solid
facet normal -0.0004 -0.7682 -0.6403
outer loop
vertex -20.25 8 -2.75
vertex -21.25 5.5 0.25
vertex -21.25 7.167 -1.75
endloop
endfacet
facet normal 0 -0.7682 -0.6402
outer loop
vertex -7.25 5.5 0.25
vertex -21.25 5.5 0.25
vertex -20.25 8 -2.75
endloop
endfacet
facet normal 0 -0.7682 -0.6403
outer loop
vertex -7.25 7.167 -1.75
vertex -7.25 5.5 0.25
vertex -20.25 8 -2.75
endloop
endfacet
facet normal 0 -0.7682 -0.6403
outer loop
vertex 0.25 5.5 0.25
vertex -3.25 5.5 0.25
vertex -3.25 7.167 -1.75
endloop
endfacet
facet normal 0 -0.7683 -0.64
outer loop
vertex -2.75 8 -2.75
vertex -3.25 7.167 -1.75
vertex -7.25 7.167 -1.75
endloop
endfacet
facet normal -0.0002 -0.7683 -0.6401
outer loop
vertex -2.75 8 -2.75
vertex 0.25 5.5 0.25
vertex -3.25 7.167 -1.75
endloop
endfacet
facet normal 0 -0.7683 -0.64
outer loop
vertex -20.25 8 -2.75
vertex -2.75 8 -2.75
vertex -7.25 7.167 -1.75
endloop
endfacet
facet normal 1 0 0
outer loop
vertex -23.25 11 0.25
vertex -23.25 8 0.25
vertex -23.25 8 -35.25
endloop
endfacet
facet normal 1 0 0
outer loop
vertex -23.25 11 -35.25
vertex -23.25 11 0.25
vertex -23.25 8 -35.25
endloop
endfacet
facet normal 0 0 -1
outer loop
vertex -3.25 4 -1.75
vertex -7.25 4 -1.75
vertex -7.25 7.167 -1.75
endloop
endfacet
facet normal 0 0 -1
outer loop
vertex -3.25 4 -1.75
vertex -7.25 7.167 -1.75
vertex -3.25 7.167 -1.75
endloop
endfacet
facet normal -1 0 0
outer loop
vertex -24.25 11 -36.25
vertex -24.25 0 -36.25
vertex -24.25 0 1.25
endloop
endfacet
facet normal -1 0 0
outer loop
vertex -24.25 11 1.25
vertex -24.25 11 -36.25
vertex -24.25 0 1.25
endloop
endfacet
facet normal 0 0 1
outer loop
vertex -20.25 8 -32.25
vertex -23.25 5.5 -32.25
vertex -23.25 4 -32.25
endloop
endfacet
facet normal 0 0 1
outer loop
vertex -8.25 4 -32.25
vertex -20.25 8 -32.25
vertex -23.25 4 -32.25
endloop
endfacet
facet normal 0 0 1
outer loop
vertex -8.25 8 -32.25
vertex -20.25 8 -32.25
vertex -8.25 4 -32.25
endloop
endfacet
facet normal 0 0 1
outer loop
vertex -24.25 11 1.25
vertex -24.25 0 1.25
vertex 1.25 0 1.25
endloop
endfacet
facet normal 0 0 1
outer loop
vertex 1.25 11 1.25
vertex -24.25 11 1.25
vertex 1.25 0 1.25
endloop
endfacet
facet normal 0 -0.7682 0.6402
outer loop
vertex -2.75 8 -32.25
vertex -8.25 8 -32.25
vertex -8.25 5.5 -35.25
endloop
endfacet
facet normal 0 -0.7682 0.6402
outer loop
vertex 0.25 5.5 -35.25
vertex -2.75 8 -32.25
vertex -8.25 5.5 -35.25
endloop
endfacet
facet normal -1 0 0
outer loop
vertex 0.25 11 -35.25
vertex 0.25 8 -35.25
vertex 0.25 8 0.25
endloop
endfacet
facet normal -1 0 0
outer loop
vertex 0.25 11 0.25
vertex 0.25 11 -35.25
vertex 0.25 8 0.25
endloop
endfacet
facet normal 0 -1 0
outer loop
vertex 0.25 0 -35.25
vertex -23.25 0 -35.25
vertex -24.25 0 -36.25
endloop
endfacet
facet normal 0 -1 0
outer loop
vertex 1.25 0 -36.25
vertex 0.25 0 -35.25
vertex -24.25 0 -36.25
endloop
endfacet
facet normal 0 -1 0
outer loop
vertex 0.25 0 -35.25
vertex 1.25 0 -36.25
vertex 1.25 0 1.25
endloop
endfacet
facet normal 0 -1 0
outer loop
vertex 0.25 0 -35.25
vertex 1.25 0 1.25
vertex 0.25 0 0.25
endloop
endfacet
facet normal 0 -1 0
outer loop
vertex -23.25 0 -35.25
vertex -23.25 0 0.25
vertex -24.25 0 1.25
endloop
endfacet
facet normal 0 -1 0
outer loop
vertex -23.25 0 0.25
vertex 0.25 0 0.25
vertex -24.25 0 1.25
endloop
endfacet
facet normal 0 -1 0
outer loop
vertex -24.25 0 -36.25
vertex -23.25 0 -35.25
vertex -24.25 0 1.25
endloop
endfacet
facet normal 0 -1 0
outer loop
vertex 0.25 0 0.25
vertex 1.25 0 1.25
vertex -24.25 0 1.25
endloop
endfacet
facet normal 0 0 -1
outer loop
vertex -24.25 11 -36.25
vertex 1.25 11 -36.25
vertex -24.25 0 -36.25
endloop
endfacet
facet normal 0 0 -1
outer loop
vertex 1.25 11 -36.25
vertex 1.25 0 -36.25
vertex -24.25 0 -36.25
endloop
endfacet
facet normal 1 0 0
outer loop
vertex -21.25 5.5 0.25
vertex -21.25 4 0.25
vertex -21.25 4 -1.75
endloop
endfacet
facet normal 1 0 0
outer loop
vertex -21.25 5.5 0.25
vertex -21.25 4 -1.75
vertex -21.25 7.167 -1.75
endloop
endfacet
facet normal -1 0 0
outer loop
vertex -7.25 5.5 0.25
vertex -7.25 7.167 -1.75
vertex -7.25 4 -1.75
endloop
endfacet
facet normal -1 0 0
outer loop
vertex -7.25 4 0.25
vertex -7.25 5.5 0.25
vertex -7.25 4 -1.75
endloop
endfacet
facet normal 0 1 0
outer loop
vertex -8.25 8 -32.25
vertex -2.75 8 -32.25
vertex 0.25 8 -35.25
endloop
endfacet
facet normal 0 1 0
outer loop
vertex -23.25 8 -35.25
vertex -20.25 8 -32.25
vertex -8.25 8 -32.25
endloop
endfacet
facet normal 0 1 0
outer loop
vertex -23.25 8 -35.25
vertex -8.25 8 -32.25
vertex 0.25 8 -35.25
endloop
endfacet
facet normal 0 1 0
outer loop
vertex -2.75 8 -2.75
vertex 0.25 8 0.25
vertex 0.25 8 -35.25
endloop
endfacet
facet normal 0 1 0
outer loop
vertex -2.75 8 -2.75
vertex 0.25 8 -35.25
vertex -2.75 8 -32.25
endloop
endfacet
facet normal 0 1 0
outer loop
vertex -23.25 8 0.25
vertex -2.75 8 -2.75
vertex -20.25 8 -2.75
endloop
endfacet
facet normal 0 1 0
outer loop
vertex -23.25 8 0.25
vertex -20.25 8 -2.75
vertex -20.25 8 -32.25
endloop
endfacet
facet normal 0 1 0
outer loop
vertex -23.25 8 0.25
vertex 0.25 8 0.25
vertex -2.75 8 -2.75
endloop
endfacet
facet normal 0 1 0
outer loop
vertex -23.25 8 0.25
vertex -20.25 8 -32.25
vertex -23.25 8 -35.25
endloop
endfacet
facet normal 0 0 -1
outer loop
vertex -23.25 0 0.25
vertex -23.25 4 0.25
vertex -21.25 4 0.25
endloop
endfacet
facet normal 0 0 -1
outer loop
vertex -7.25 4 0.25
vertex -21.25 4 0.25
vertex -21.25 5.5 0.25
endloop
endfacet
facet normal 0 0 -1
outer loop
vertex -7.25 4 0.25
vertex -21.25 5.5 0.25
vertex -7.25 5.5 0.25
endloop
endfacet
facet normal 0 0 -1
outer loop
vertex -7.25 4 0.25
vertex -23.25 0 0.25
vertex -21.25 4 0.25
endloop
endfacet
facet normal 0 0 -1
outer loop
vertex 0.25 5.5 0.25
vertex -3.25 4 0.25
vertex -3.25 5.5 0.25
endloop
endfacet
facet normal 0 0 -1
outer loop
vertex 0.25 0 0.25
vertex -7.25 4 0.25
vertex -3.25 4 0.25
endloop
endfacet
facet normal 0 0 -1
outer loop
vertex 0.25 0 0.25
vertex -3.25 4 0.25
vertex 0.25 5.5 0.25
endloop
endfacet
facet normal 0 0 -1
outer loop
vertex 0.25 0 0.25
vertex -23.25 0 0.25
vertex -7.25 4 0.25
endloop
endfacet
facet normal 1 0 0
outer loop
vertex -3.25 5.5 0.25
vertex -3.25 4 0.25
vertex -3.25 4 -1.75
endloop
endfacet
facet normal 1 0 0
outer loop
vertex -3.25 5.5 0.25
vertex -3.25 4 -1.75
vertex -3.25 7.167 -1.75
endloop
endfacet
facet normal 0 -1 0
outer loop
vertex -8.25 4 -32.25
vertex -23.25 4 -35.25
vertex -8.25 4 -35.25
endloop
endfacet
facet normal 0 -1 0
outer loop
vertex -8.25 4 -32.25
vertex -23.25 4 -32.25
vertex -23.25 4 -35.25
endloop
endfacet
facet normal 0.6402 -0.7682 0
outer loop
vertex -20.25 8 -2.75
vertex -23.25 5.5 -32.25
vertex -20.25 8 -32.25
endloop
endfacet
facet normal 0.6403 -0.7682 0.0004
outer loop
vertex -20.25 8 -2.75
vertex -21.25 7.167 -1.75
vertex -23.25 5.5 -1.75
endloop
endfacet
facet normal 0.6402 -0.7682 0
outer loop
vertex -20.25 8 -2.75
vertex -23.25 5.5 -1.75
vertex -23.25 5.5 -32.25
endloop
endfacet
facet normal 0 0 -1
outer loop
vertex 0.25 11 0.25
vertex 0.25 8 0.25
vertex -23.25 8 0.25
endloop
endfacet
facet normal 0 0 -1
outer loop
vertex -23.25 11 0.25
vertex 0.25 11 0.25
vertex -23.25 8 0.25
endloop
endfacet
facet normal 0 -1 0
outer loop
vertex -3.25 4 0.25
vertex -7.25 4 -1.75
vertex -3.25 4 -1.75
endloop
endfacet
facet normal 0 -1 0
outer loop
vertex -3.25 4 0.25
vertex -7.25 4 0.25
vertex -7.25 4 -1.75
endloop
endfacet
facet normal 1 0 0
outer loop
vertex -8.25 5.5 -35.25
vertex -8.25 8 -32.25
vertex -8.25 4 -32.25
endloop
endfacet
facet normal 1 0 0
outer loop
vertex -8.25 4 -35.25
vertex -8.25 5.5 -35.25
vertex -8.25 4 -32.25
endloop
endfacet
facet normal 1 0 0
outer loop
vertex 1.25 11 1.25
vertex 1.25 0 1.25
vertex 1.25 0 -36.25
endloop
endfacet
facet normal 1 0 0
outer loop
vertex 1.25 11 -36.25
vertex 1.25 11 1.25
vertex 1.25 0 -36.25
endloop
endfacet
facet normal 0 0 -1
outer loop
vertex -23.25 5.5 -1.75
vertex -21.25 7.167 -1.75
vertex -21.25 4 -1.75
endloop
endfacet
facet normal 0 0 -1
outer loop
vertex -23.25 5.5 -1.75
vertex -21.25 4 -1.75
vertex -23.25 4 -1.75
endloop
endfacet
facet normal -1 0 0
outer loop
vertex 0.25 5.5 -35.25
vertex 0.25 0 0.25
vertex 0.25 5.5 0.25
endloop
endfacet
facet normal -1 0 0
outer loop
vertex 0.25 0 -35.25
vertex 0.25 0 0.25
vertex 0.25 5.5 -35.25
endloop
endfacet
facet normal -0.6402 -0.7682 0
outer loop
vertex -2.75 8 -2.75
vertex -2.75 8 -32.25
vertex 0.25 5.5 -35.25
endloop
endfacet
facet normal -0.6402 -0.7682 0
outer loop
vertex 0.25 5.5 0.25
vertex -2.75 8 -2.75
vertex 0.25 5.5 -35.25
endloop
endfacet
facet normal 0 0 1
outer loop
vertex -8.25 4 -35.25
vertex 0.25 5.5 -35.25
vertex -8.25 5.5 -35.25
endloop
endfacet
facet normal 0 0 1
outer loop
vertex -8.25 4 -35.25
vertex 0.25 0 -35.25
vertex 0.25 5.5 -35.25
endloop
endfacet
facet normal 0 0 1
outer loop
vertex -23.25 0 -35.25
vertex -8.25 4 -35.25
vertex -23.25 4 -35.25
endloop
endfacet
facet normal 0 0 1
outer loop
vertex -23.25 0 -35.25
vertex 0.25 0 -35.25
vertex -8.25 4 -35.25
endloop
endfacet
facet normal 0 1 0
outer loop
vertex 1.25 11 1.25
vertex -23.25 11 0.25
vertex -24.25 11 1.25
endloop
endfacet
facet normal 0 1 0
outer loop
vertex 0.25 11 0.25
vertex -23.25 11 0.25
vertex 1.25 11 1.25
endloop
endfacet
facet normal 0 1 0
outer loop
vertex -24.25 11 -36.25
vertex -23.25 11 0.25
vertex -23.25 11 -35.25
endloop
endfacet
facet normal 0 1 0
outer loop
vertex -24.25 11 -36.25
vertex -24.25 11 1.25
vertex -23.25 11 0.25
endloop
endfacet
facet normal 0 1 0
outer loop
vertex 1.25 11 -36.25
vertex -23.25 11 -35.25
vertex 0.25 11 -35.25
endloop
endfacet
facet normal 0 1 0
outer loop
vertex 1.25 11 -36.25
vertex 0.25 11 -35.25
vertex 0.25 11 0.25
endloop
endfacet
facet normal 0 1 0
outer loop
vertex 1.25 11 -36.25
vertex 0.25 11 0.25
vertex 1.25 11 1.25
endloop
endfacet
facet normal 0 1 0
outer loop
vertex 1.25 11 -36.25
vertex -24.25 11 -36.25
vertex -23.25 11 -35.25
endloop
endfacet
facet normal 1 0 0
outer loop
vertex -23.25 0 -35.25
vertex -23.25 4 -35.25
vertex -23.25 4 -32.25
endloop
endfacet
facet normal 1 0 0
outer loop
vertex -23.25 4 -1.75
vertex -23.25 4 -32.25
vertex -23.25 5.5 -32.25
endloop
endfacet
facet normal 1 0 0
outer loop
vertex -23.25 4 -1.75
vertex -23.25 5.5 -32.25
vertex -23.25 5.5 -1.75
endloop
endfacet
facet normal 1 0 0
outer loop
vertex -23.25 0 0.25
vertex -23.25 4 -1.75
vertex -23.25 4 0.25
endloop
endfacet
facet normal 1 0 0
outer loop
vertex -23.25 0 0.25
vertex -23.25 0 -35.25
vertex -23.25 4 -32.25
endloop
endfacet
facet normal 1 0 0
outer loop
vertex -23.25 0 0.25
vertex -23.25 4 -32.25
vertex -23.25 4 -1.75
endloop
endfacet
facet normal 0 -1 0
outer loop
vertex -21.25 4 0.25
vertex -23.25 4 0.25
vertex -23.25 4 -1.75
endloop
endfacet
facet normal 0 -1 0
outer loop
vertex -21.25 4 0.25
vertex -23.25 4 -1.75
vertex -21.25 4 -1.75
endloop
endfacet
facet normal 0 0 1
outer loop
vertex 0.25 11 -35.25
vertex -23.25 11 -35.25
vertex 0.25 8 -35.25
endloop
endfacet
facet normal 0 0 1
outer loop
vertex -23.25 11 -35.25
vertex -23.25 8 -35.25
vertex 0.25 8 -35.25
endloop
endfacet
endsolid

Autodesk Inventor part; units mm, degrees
ref_plane "YZ Plane" through (0, 0, 0) normal (1, 0, 0) x (0, 1, 0)
sketch "Sketch1" plane through (0, 0, 0) normal (0, 1, 0) x (-1, 0, 0)
  line L0 (0, 0) -> (23, 0) construction
  line L1 (23, 0) -> (23, -35) construction
  line L2 (23, -35) -> (0, -35) construction
  line L3 (0, -35) -> (0, 0) construction
  line L4 (23.25, -35.25) -> (23.25, 0.25)
  line L5 (23.25, 0.25) -> (-0.25, 0.25)
  line L6 (-0.25, 0.25) -> (-0.25, -35.25)
  line L7 (-0.25, -35.25) -> (23.25, -35.25)
  line L8 (24.25, 1.25) -> (24.25, -36.25)
  line L9 (24.25, -36.25) -> (-1.25, -36.25)
  line L10 (-1.25, -36.25) -> (-1.25, 1.25)
  line L11 (-1.25, 1.25) -> (24.25, 1.25)
  dimension "d0" = 35
  dimension "d1" = 23
  dimension "d2" = 0.25
  dimension "d3" = 1
extrude "Extrusion1" add sketch "Sketch1" along normal blind 8
sketch "Sketch9" plane through (0.25, 0, 0.25) normal (0, 0, -1) x (-1, 0, 0)
  line L0 (-1, 0) -> (24.5, 0) projected
  line L1 (24.5, 0) -> (24.5, 8) projected
  line L2 (-1, 8) -> (24.5, 8) projected
  line L3 (-1, 0) -> (-1, 8) projected
  line L4 (0, 0) -> (23.5, 0) projected
  line L5 (23.5, 0) -> (23.5, 8) projected
  line L6 (0, 8) -> (23.5, 8) projected
  line L7 (0, 0) -> (0, 8) projected
  line L8 (0, 8) -> (3, 8)
  line L9 (24.5, 8) -> (-1, 8) projected
  line L10 (3, 8) -> (0, 5.5)
  line L11 (0, 0) -> (0, 8) projected
  line L12 (0, 8) -> (0, 5.5)
  point P0 (0.25, 0)
  point P1 (0, 8)
  dimension "d25" = 3
  dimension "d26" = 2.5
extrude "Extrusion7" add sketch "Sketch9" along normal up to surface (35.5 mm away) contours L7 L2 L10
ref_plane "Work Plane5" through (-11.5, 0, 1.25) normal (1, 0, 0) x (0, 0, -1)
mirror "Mirror4" about plane through (-11.5, 0, 1.25) normal (1, 0, 0) of "Extrusion7"
sketch "Sketch10" plane through (0.25, 0, -35.25) normal (-1, 0, 0) x (0, 0, 1)
  line L0 (-1, 0) -> (36.5, 0) projected
  line L1 (36.5, 0) -> (36.5, 8) projected
  line L2 (-1, 8) -> (36.5, 8) projected
  line L3 (-1, 0) -> (-1, 8) projected
  line L4 (35.5, 5.5) -> (0, 5.5) projected
  line L5 (0, 0) -> (0, 5.5) projected
  line L6 (0, 0) -> (35.5, 0) projected
  line L7 (35.5, 0) -> (35.5, 5.5) projected
  line L8 (36.5, 8) -> (-1, 8) projected
  line L9 (0, 8) -> (3, 8)
  line L10 (0, 0) -> (0, 5.5) projected
  line L11 (3, 8) -> (0, 5.5)
  line L12 (35.5, 5.5) -> (0, 5.5) projected
  line L13 (0, 8) -> (0, 5.5)
  point P0 (35.25, 0)
  point P1 (3, 8)
  dimension "d29" = 3
extrude "Extrusion8" add sketch "Sketch10" along normal up to surface (23.5 mm away) contours L13 L2 L11
ref_plane "Work Plane6" through (-24.25, 0, -17.5) normal (0, 0, 1) x (1, 0, 0)
mirror "Mirror5" about plane through (-24.25, 0, -17.5) normal (0, 0, 1) of "Extrusion8"
sketch "Sketch11" plane through (0, 8, 0) normal (0, 1, 0) x (1, 0, 0)
  line L0 (1.25, -1.25) -> (1.25, 36.25) projected
  line L1 (-24.25, -1.25) -> (1.25, -1.25) projected
  line L2 (-24.25, 36.25) -> (-24.25, -1.25) projected
  line L3 (1.25, 36.25) -> (-24.25, 36.25) projected
  line L4 (-23.25, 35.25) -> (0.25, 35.25) projected
  line L5 (-23.25, -0.25) -> (-23.25, 35.25) projected
  line L6 (0.25, -0.25) -> (-23.25, -0.25) projected
  line L7 (0.25, 35.25) -> (0.25, -0.25) projected
  point P0 (0, 0)
extrude "Extrusion9" add sketch "Sketch11" along normal blind 3
sketch "Sketch12" plane through (-23.25, 0, -35.25) normal (0, 0, 1) x (1, 0, 0)
  line L0 (23.5, 5.5) -> (0, 5.5) projected
  line L1 (0, 0) -> (0, 5.5) projected
  line L2 (0, 0) -> (23.5, 0) projected
  line L3 (23.5, 0) -> (23.5, 5.5) projected
  line L4 (0, 5.5) -> (15, 5.5)
  line L5 (15, 5.5) -> (15, 3.5)
  line L6 (15, 3.5) -> (0, 3.5)
  line L7 (0, 3.5) -> (0, 5.5)
  point P0 (23.25, 0)
  point P1 (0, 5.5)
  point P2 (0, 3.5)
  dimension "d34" = 3.5
  dimension "d35" = 2
  dimension "d36" = 15
extrude "Extrusion10" add sketch "Sketch12" along normal blind 3 contours L5 L6 L1 L0
sketch "Sketch13" plane through (0.25, 0, 0.25) normal (0, 0, -1) x (-1, 0, 0)
  line L0 (23.5, 3.5) -> (23.5, 5.5) projected
  line L1 (8.5, 5.5) -> (23.5, 5.5) projected
  line L2 (8.5, 3.5) -> (23.5, 3.5) projected
  line L3 (23.5, 0) -> (23.5, 3.5) projected
  line L4 (23.5, 0) -> (0, 0) projected
  line L5 (0, 0) -> (0, 5.5) projected
  line L6 (0, 5.5) -> (8.5, 5.5) projected
  line L7 (8.5, 5.5) -> (8.5, 3.5) projected
  line L8 (7.5, 5.5) -> (7.5, 3.5)
  line L9 (7.5, 3.5) -> (3.5, 3.5)
  line L10 (3.5, 3.5) -> (3.5, 5.5)
  line L11 (3.5, 5.5) -> (7.5, 5.5)
  line L12 (21.5, 5.5) -> (23.5, 5.5)
  line L13 (23.5, 5.5) -> (23.5, 3.5)
  line L14 (23.5, 3.5) -> (21.5, 3.5)
  line L15 (21.5, 3.5) -> (21.5, 5.5)
  point P0 (0.25, 0)
  dimension "d40" = 4
  dimension "d41" = 2
  dimension "d42" = 3.5
  dimension "d49" = 2
extrude "Extrusion11" add sketch "Sketch13" along normal blind 2 contours L2 L15 L1 L0 | L8 L9 L10 L6
sketch "Sketch18" plane through (-23.25, 5.5, -35.25) normal (0, 1, 0) x (1, 0, 0)
  line L0 (16, -35.5) -> (20, -35.5) projected
  line L1 (20, -35.5) -> (20, -33.5) projected
  line L2 (16, -33.5) -> (20, -33.5) projected
  line L3 (16, -35.5) -> (16, -33.5) projected
  line L4 (0, -35.5) -> (2, -35.5) projected
  line L5 (2, -35.5) -> (2, -33.5) projected
  line L6 (0, -33.5) -> (2, -33.5) projected
  line L7 (0, -33.5) -> (0, -35.5) projected
  line L8 (15, 0) -> (0, 0) projected
  line L9 (0, 0) -> (0, -3) projected
  line L10 (15, -3) -> (0, -3) projected
  line L11 (15, 0) -> (15, -3) projected
  point P0 (23.25, -35.25)
extrude "Extrusion14" add sketch "Sketch18" along normal up to surface (2.5 mm away)
sketch "Sketch20" plane through (-23.25, 3.5, -35.25) normal (0, -1, 0) x (1, 0, 0)
  line L0 (0, 35.5) -> (2, 35.5) projected
  line L1 (0, 33.5) -> (0, 35.5) projected
  line L2 (2, 33.5) -> (0, 33.5) projected
  line L3 (2, 35.5) -> (2, 33.5) projected
  line L4 (16, 35.5) -> (20, 35.5) projected
  line L5 (16, 35.5) -> (16, 33.5) projected
  line L6 (20, 33.5) -> (16, 33.5) projected
  line L7 (20, 35.5) -> (20, 33.5) projected
  line L8 (15, 0) -> (0, 0) projected
  line L9 (15, 0) -> (15, 3) projected
  line L10 (0, 3) -> (15, 3) projected
  line L11 (0, 0) -> (0, 3) projected
  point P0 (23.25, 35.25)
extrude "Extrusion16" cut sketch "Sketch20" against normal blind 0.5
sketch "Sketch22" plane through (-23.25, 0, -35.25) normal (0, 0, 1) x (1, 0, 0)
  point P0 (23.25, 0)
sketch "Sketch23" plane through (-23.25, 0, -35.25) normal (0, 0, 1) x (1, 0, 0)
  point P0 (23.25, 0)
properties part number "sensorCover"
